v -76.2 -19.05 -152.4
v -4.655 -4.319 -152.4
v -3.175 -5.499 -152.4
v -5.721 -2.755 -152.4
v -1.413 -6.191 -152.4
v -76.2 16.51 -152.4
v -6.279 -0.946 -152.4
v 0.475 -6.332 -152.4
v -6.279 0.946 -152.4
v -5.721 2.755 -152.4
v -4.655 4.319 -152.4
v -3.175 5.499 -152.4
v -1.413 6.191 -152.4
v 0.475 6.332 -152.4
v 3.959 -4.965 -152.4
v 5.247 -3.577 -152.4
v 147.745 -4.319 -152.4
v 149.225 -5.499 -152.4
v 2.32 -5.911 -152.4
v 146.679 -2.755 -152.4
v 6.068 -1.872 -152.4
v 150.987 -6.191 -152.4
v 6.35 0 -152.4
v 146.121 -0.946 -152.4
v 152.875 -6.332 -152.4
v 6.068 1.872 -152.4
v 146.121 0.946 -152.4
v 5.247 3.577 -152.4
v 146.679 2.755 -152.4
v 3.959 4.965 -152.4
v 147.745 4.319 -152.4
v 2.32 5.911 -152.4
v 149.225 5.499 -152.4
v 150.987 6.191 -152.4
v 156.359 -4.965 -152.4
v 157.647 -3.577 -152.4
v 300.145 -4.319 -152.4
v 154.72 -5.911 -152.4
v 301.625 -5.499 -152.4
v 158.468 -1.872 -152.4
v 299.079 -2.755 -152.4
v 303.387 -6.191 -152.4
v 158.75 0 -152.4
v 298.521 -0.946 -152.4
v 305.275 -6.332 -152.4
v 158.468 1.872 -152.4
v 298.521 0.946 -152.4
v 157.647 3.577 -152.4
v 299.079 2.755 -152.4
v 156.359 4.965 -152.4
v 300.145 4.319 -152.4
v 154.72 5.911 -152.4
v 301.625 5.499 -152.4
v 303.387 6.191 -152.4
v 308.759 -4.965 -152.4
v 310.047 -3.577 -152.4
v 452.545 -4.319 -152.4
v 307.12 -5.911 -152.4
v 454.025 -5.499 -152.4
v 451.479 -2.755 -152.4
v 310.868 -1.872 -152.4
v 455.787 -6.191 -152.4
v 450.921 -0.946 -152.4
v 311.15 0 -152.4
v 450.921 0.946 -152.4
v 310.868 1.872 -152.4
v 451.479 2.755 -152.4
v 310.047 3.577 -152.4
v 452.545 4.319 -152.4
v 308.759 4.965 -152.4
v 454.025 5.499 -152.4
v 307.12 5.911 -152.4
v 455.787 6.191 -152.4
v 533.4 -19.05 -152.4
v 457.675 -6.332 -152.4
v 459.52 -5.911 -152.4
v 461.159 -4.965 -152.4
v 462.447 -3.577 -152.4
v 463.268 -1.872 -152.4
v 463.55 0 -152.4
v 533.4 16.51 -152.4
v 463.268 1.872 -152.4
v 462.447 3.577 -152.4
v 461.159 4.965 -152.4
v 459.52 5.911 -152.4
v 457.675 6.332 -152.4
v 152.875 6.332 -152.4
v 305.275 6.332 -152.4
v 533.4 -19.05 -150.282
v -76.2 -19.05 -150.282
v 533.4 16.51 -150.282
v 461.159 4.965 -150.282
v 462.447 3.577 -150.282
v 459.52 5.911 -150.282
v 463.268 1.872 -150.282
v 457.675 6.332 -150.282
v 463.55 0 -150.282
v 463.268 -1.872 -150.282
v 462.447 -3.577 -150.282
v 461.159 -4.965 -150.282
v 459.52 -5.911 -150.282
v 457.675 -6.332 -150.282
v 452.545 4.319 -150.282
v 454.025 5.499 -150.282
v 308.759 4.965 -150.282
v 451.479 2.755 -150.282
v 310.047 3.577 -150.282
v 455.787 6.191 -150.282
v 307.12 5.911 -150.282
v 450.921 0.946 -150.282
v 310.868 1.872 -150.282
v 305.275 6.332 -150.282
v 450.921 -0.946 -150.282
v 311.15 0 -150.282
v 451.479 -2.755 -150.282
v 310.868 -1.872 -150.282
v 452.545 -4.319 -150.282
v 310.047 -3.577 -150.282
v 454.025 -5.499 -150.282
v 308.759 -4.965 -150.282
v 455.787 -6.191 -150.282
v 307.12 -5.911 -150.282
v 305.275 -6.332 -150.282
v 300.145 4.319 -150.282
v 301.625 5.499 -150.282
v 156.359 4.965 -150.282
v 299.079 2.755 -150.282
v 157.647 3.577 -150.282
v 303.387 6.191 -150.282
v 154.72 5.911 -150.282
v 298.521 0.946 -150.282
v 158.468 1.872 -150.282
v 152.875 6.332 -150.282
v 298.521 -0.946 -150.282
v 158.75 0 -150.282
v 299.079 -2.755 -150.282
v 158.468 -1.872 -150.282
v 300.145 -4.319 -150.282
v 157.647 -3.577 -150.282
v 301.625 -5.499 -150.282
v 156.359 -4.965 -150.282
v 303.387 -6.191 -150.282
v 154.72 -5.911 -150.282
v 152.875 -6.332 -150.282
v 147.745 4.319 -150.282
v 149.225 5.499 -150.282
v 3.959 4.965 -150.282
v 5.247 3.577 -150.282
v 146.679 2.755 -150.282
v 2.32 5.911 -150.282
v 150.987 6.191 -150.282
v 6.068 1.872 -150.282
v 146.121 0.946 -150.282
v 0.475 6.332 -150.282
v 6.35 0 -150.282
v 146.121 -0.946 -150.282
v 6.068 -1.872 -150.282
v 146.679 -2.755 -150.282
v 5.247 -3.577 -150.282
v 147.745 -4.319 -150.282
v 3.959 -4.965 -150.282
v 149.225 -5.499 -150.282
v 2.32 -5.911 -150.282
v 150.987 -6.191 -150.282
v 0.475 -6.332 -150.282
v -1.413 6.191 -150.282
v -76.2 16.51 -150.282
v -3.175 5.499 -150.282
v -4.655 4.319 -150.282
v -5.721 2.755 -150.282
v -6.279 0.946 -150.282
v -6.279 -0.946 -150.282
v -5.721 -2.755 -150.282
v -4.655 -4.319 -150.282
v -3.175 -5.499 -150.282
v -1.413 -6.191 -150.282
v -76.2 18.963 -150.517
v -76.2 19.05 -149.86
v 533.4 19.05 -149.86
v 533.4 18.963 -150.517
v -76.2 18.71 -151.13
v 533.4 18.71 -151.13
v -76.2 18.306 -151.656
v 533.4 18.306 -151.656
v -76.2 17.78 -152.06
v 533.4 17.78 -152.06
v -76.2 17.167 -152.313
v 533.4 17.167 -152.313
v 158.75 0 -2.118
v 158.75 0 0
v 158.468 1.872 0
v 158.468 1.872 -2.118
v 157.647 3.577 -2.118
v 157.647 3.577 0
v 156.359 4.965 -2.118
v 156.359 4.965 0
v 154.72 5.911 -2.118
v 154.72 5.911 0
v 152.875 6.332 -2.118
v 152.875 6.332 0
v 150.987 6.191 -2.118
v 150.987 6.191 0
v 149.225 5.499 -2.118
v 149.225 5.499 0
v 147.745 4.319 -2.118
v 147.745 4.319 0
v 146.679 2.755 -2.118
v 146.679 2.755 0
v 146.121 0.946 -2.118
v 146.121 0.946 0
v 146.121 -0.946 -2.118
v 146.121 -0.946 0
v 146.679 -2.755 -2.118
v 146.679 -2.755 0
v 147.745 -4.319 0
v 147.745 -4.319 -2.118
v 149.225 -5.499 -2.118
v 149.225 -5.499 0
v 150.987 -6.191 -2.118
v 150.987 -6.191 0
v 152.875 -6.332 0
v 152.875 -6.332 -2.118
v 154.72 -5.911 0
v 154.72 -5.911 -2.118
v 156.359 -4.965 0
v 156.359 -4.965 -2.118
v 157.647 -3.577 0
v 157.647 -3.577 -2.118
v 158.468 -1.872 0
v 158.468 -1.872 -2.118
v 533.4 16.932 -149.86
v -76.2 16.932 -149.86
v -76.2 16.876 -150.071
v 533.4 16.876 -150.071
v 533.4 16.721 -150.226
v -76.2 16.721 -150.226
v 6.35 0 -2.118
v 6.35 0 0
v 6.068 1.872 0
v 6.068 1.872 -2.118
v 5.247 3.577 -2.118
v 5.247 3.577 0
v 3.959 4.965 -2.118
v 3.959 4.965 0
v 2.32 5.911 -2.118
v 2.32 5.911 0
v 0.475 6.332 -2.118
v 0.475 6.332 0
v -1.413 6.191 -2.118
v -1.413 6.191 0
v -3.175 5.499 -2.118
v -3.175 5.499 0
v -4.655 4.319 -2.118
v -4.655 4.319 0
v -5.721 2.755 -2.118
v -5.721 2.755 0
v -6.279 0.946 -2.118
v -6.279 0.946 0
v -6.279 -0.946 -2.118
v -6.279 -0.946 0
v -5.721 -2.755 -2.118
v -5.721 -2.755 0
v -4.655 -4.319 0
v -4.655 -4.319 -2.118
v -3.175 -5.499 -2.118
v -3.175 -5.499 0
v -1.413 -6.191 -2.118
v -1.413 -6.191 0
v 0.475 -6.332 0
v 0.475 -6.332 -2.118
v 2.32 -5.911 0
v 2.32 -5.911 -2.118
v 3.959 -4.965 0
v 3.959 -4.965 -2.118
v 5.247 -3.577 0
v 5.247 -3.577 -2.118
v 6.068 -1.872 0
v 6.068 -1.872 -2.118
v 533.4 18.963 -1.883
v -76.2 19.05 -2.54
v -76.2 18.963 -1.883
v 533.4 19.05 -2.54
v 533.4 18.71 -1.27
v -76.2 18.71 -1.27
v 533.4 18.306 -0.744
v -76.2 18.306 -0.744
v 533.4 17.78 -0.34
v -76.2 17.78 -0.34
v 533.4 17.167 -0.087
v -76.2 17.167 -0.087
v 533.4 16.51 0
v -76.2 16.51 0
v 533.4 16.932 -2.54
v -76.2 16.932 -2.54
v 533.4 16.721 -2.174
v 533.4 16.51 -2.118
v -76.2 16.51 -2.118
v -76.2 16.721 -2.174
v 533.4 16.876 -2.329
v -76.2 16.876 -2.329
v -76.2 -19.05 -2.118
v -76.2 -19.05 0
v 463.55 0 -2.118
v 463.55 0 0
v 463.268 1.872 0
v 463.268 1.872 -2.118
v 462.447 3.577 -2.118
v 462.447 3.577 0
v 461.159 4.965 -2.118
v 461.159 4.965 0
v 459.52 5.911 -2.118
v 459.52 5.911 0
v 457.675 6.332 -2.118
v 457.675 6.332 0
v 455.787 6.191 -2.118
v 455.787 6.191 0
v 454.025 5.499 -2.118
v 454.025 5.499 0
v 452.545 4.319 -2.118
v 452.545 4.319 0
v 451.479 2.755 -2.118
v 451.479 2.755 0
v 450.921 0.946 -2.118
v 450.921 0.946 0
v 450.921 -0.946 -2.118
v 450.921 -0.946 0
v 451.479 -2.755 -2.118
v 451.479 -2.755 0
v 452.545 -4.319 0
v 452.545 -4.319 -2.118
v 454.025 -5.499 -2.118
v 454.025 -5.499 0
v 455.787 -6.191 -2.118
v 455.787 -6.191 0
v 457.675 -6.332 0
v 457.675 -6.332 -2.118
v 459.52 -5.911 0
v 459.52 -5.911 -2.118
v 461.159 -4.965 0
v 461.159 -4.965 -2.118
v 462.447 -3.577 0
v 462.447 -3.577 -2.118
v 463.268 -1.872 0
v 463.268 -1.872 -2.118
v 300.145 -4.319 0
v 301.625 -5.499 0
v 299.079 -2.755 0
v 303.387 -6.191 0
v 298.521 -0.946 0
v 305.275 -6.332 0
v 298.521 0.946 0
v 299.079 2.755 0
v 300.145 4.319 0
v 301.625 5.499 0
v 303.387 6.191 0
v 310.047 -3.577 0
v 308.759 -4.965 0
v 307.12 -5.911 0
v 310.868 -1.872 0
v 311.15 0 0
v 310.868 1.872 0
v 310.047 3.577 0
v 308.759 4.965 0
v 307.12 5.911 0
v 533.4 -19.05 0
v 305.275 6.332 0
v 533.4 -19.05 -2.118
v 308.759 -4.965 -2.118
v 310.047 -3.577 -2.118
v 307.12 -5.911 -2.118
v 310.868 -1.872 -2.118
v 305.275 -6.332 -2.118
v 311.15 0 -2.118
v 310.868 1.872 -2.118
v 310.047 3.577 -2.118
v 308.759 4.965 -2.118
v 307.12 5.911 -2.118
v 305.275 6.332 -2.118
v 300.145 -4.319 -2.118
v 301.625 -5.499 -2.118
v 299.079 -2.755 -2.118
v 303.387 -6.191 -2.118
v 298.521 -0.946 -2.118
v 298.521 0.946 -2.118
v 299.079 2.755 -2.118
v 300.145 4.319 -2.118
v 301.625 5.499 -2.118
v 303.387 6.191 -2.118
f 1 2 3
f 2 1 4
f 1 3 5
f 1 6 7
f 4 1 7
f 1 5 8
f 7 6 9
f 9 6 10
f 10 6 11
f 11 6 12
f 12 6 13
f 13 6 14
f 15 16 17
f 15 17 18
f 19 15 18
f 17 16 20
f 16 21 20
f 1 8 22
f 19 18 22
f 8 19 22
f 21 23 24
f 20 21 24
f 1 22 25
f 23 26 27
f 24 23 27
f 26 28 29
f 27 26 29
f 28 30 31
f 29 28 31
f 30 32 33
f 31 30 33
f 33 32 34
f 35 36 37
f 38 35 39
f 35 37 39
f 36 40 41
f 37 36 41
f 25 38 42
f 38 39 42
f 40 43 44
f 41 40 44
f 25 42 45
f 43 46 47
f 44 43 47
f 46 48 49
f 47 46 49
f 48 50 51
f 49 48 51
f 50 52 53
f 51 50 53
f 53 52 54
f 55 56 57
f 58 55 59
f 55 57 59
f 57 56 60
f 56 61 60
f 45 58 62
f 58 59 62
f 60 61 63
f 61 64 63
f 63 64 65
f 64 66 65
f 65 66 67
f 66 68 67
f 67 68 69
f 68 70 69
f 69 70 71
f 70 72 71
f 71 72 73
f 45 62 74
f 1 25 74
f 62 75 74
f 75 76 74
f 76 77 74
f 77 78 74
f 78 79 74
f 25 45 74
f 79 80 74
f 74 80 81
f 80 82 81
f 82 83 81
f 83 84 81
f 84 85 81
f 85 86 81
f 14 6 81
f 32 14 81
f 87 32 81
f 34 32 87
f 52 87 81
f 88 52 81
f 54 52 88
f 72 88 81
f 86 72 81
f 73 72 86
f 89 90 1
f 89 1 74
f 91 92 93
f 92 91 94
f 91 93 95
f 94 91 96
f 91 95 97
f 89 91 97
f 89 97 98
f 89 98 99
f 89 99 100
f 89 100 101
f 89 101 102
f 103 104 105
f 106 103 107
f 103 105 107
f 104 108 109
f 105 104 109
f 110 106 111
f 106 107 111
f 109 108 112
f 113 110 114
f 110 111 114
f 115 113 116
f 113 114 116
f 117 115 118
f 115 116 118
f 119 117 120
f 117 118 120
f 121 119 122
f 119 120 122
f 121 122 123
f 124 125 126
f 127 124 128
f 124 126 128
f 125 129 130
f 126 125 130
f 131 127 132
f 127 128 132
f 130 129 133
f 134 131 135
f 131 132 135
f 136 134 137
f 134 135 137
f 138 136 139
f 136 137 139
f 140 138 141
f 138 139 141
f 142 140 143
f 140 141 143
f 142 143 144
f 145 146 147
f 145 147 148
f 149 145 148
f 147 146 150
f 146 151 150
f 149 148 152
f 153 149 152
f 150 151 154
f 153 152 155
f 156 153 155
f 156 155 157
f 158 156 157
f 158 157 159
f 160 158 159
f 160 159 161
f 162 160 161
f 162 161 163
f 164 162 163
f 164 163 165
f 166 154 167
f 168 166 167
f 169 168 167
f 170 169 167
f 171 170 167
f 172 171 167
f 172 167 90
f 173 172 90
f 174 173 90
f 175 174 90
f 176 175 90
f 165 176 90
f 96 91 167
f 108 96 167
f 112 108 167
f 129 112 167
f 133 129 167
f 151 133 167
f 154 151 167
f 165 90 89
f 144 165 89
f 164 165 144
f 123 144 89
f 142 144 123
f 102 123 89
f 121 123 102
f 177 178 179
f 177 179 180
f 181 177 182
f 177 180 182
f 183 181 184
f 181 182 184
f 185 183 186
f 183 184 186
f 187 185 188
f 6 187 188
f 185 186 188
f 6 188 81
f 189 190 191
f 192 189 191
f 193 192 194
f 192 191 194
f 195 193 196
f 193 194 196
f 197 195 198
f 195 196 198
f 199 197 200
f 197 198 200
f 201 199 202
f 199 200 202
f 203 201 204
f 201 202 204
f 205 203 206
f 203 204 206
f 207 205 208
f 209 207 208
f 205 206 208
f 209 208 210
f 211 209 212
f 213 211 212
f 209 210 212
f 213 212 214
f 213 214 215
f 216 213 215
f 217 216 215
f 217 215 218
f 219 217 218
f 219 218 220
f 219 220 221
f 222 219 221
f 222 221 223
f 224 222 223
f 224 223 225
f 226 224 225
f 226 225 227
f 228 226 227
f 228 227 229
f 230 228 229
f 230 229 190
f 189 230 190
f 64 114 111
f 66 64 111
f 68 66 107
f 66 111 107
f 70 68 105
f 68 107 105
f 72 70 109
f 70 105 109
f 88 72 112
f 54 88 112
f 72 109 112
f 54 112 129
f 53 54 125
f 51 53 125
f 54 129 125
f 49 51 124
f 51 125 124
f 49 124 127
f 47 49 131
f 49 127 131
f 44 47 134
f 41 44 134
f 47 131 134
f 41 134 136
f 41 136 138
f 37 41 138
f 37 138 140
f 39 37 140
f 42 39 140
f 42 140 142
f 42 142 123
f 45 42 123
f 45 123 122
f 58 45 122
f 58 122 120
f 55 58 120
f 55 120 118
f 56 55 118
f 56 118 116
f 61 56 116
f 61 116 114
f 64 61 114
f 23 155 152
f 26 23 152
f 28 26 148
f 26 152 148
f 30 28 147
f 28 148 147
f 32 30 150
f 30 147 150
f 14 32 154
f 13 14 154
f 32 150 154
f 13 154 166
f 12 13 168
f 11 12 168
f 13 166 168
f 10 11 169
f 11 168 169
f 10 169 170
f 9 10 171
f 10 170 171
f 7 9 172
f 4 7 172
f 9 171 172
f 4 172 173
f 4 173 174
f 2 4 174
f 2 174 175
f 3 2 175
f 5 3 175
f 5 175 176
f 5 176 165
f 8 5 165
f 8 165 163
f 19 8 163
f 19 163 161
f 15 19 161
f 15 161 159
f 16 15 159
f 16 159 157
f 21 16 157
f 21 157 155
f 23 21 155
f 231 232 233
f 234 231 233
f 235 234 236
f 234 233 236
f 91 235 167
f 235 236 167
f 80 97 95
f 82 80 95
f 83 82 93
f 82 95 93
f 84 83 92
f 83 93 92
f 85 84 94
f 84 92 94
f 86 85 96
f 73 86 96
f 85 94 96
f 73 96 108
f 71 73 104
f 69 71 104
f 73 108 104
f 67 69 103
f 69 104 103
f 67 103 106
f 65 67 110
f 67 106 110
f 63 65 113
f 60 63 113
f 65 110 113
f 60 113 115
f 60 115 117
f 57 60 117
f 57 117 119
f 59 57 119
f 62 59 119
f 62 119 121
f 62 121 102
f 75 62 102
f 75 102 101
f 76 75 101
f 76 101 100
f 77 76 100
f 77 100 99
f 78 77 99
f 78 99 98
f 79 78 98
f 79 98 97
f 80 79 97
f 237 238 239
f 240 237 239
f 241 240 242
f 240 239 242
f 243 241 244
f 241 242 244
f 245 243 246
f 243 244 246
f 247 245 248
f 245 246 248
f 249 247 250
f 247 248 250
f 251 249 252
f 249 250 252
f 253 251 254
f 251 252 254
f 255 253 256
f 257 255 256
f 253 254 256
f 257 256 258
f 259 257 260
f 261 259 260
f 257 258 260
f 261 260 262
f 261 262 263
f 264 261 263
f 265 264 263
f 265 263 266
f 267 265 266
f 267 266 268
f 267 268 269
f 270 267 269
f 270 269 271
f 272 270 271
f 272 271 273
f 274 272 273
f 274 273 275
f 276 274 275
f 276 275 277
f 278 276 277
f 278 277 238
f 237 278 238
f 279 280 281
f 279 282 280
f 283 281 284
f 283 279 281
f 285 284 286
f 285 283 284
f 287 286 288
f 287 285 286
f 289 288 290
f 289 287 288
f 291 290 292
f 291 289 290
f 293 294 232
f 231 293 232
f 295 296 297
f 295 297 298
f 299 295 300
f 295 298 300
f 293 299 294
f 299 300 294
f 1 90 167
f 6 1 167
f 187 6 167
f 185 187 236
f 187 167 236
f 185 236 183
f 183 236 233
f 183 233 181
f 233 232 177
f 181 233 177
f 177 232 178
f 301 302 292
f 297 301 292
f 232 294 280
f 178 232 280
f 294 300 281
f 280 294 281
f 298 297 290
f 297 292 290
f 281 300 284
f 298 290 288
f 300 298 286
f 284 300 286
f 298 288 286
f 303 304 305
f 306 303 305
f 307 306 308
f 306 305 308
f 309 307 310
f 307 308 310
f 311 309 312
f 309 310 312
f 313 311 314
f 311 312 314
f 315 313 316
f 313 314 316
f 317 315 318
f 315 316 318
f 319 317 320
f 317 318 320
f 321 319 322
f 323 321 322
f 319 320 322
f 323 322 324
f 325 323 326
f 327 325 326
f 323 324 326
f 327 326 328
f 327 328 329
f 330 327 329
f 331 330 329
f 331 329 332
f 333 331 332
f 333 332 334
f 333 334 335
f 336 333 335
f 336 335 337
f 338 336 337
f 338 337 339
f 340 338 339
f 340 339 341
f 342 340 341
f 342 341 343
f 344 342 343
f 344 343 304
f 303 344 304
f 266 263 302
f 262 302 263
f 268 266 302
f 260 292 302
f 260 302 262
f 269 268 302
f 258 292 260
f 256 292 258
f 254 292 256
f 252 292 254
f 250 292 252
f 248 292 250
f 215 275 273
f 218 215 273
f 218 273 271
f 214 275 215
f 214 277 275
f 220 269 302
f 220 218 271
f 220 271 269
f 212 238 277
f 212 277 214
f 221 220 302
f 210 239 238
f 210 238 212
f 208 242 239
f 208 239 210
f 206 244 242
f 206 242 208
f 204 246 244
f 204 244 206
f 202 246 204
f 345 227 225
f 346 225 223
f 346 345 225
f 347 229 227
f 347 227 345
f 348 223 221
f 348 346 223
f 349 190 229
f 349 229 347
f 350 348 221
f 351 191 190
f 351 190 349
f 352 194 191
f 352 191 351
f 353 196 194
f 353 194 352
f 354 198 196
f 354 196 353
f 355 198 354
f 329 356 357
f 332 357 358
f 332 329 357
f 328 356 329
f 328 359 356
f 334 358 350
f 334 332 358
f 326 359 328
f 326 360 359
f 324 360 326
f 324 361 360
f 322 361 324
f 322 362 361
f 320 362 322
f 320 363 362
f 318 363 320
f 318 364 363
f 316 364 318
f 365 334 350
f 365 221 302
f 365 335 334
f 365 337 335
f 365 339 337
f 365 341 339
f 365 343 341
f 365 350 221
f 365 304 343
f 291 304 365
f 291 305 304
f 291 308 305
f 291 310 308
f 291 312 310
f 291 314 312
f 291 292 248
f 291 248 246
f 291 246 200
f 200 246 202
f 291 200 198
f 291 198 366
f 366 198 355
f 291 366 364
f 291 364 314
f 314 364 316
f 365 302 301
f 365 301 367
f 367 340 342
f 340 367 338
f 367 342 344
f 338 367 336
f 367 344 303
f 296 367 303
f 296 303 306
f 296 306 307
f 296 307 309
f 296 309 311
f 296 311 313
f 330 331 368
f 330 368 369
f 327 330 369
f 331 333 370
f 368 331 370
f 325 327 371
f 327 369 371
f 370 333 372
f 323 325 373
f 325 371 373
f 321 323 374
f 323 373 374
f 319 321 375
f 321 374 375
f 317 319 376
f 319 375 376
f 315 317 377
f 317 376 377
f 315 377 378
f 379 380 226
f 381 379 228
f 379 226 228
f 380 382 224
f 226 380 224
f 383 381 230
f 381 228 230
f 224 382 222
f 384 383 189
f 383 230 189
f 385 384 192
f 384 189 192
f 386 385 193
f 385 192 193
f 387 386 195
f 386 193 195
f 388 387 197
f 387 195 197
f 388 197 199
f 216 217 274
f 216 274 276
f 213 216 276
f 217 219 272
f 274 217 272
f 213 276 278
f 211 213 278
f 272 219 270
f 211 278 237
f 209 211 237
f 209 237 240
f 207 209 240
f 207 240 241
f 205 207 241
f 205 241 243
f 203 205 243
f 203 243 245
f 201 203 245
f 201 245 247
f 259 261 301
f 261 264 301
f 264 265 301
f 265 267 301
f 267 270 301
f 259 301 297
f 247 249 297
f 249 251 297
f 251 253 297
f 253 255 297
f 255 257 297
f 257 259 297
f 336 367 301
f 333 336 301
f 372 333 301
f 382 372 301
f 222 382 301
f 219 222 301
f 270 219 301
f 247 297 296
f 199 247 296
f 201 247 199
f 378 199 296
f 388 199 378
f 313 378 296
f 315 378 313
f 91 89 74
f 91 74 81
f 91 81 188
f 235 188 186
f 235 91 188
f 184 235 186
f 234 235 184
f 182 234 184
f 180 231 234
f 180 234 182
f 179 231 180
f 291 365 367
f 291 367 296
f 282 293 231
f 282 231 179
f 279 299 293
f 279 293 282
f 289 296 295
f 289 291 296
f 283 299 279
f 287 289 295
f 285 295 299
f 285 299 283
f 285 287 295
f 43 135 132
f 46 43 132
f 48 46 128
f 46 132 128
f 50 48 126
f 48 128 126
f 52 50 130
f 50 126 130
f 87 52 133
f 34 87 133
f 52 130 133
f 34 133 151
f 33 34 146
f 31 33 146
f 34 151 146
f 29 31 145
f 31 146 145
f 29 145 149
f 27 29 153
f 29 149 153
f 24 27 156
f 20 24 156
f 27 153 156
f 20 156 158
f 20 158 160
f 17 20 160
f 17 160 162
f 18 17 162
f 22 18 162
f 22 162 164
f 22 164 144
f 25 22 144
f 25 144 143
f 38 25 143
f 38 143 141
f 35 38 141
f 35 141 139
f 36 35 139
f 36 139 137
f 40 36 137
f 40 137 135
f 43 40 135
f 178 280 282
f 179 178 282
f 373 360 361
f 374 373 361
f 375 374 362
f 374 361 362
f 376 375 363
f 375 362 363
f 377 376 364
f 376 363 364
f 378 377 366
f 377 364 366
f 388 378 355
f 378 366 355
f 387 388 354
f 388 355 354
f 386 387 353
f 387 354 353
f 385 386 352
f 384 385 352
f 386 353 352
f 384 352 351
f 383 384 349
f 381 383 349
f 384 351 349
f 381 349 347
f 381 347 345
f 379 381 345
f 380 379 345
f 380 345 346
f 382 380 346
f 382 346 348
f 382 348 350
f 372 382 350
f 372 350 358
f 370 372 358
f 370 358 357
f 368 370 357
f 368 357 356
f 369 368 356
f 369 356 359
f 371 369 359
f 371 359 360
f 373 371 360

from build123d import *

# Parameters (mm, degrees)
F0_W     = 609.6
F0_H     = 38.1
F0_R     = 6.35
F1_DEPTH = 152.4
F2_R     = 2.54
F4_DEPTH = 609.6


with BuildPart() as f1:
    # F0 (on Top) → F1 (new body)
    with BuildSketch(Plane.XY):
        with Locations((228.6, 0)):
            Rectangle(F0_W, F0_H)
        Circle(F0_R, mode=Mode.SUBTRACT)
        with Locations((152.4, 0)):
            Circle(F0_R, mode=Mode.SUBTRACT)
        with Locations((304.8, 0)):
            Circle(F0_R, mode=Mode.SUBTRACT)
        with Locations((457.2, 0)):
            Circle(F0_R, mode=Mode.SUBTRACT)
    extrude(amount=-F1_DEPTH)

    # F2
    f2_edges = [f1.edges().sort_by_distance(p)[0] for p in [
        (228.6, 19.05, 0),
        (228.6, 19.05, -152.4),
    ]]
    fillet(f2_edges, radius=F2_R)

    # F3 (on face) → F4 (cut, through all)
    with BuildSketch(Plane(origin=(-76.2, 0, 0), x_dir=(0, -1, 0), z_dir=(-1, 0, 0))):
        with BuildLine():
            Line((-16.51, -150.282402), (19.05, -150.282402))
            Line((19.05, -150.282402), (19.05, -2.117598))
            Line((19.05, -2.117598), (-16.51, -2.117598))
            ThreePointArc((-16.51, -2.117598), (-16.808684, -2.241316), (-16.932402, -2.54))
            Line((-16.932402, -2.54), (-16.932402, -149.86))
            ThreePointArc((-16.932402, -149.86), (-16.808684, -150.158684), (-16.51, -150.282402))
        make_face()
    extrude(amount=-F4_DEPTH, mode=Mode.SUBTRACT)


solid = f1.part
